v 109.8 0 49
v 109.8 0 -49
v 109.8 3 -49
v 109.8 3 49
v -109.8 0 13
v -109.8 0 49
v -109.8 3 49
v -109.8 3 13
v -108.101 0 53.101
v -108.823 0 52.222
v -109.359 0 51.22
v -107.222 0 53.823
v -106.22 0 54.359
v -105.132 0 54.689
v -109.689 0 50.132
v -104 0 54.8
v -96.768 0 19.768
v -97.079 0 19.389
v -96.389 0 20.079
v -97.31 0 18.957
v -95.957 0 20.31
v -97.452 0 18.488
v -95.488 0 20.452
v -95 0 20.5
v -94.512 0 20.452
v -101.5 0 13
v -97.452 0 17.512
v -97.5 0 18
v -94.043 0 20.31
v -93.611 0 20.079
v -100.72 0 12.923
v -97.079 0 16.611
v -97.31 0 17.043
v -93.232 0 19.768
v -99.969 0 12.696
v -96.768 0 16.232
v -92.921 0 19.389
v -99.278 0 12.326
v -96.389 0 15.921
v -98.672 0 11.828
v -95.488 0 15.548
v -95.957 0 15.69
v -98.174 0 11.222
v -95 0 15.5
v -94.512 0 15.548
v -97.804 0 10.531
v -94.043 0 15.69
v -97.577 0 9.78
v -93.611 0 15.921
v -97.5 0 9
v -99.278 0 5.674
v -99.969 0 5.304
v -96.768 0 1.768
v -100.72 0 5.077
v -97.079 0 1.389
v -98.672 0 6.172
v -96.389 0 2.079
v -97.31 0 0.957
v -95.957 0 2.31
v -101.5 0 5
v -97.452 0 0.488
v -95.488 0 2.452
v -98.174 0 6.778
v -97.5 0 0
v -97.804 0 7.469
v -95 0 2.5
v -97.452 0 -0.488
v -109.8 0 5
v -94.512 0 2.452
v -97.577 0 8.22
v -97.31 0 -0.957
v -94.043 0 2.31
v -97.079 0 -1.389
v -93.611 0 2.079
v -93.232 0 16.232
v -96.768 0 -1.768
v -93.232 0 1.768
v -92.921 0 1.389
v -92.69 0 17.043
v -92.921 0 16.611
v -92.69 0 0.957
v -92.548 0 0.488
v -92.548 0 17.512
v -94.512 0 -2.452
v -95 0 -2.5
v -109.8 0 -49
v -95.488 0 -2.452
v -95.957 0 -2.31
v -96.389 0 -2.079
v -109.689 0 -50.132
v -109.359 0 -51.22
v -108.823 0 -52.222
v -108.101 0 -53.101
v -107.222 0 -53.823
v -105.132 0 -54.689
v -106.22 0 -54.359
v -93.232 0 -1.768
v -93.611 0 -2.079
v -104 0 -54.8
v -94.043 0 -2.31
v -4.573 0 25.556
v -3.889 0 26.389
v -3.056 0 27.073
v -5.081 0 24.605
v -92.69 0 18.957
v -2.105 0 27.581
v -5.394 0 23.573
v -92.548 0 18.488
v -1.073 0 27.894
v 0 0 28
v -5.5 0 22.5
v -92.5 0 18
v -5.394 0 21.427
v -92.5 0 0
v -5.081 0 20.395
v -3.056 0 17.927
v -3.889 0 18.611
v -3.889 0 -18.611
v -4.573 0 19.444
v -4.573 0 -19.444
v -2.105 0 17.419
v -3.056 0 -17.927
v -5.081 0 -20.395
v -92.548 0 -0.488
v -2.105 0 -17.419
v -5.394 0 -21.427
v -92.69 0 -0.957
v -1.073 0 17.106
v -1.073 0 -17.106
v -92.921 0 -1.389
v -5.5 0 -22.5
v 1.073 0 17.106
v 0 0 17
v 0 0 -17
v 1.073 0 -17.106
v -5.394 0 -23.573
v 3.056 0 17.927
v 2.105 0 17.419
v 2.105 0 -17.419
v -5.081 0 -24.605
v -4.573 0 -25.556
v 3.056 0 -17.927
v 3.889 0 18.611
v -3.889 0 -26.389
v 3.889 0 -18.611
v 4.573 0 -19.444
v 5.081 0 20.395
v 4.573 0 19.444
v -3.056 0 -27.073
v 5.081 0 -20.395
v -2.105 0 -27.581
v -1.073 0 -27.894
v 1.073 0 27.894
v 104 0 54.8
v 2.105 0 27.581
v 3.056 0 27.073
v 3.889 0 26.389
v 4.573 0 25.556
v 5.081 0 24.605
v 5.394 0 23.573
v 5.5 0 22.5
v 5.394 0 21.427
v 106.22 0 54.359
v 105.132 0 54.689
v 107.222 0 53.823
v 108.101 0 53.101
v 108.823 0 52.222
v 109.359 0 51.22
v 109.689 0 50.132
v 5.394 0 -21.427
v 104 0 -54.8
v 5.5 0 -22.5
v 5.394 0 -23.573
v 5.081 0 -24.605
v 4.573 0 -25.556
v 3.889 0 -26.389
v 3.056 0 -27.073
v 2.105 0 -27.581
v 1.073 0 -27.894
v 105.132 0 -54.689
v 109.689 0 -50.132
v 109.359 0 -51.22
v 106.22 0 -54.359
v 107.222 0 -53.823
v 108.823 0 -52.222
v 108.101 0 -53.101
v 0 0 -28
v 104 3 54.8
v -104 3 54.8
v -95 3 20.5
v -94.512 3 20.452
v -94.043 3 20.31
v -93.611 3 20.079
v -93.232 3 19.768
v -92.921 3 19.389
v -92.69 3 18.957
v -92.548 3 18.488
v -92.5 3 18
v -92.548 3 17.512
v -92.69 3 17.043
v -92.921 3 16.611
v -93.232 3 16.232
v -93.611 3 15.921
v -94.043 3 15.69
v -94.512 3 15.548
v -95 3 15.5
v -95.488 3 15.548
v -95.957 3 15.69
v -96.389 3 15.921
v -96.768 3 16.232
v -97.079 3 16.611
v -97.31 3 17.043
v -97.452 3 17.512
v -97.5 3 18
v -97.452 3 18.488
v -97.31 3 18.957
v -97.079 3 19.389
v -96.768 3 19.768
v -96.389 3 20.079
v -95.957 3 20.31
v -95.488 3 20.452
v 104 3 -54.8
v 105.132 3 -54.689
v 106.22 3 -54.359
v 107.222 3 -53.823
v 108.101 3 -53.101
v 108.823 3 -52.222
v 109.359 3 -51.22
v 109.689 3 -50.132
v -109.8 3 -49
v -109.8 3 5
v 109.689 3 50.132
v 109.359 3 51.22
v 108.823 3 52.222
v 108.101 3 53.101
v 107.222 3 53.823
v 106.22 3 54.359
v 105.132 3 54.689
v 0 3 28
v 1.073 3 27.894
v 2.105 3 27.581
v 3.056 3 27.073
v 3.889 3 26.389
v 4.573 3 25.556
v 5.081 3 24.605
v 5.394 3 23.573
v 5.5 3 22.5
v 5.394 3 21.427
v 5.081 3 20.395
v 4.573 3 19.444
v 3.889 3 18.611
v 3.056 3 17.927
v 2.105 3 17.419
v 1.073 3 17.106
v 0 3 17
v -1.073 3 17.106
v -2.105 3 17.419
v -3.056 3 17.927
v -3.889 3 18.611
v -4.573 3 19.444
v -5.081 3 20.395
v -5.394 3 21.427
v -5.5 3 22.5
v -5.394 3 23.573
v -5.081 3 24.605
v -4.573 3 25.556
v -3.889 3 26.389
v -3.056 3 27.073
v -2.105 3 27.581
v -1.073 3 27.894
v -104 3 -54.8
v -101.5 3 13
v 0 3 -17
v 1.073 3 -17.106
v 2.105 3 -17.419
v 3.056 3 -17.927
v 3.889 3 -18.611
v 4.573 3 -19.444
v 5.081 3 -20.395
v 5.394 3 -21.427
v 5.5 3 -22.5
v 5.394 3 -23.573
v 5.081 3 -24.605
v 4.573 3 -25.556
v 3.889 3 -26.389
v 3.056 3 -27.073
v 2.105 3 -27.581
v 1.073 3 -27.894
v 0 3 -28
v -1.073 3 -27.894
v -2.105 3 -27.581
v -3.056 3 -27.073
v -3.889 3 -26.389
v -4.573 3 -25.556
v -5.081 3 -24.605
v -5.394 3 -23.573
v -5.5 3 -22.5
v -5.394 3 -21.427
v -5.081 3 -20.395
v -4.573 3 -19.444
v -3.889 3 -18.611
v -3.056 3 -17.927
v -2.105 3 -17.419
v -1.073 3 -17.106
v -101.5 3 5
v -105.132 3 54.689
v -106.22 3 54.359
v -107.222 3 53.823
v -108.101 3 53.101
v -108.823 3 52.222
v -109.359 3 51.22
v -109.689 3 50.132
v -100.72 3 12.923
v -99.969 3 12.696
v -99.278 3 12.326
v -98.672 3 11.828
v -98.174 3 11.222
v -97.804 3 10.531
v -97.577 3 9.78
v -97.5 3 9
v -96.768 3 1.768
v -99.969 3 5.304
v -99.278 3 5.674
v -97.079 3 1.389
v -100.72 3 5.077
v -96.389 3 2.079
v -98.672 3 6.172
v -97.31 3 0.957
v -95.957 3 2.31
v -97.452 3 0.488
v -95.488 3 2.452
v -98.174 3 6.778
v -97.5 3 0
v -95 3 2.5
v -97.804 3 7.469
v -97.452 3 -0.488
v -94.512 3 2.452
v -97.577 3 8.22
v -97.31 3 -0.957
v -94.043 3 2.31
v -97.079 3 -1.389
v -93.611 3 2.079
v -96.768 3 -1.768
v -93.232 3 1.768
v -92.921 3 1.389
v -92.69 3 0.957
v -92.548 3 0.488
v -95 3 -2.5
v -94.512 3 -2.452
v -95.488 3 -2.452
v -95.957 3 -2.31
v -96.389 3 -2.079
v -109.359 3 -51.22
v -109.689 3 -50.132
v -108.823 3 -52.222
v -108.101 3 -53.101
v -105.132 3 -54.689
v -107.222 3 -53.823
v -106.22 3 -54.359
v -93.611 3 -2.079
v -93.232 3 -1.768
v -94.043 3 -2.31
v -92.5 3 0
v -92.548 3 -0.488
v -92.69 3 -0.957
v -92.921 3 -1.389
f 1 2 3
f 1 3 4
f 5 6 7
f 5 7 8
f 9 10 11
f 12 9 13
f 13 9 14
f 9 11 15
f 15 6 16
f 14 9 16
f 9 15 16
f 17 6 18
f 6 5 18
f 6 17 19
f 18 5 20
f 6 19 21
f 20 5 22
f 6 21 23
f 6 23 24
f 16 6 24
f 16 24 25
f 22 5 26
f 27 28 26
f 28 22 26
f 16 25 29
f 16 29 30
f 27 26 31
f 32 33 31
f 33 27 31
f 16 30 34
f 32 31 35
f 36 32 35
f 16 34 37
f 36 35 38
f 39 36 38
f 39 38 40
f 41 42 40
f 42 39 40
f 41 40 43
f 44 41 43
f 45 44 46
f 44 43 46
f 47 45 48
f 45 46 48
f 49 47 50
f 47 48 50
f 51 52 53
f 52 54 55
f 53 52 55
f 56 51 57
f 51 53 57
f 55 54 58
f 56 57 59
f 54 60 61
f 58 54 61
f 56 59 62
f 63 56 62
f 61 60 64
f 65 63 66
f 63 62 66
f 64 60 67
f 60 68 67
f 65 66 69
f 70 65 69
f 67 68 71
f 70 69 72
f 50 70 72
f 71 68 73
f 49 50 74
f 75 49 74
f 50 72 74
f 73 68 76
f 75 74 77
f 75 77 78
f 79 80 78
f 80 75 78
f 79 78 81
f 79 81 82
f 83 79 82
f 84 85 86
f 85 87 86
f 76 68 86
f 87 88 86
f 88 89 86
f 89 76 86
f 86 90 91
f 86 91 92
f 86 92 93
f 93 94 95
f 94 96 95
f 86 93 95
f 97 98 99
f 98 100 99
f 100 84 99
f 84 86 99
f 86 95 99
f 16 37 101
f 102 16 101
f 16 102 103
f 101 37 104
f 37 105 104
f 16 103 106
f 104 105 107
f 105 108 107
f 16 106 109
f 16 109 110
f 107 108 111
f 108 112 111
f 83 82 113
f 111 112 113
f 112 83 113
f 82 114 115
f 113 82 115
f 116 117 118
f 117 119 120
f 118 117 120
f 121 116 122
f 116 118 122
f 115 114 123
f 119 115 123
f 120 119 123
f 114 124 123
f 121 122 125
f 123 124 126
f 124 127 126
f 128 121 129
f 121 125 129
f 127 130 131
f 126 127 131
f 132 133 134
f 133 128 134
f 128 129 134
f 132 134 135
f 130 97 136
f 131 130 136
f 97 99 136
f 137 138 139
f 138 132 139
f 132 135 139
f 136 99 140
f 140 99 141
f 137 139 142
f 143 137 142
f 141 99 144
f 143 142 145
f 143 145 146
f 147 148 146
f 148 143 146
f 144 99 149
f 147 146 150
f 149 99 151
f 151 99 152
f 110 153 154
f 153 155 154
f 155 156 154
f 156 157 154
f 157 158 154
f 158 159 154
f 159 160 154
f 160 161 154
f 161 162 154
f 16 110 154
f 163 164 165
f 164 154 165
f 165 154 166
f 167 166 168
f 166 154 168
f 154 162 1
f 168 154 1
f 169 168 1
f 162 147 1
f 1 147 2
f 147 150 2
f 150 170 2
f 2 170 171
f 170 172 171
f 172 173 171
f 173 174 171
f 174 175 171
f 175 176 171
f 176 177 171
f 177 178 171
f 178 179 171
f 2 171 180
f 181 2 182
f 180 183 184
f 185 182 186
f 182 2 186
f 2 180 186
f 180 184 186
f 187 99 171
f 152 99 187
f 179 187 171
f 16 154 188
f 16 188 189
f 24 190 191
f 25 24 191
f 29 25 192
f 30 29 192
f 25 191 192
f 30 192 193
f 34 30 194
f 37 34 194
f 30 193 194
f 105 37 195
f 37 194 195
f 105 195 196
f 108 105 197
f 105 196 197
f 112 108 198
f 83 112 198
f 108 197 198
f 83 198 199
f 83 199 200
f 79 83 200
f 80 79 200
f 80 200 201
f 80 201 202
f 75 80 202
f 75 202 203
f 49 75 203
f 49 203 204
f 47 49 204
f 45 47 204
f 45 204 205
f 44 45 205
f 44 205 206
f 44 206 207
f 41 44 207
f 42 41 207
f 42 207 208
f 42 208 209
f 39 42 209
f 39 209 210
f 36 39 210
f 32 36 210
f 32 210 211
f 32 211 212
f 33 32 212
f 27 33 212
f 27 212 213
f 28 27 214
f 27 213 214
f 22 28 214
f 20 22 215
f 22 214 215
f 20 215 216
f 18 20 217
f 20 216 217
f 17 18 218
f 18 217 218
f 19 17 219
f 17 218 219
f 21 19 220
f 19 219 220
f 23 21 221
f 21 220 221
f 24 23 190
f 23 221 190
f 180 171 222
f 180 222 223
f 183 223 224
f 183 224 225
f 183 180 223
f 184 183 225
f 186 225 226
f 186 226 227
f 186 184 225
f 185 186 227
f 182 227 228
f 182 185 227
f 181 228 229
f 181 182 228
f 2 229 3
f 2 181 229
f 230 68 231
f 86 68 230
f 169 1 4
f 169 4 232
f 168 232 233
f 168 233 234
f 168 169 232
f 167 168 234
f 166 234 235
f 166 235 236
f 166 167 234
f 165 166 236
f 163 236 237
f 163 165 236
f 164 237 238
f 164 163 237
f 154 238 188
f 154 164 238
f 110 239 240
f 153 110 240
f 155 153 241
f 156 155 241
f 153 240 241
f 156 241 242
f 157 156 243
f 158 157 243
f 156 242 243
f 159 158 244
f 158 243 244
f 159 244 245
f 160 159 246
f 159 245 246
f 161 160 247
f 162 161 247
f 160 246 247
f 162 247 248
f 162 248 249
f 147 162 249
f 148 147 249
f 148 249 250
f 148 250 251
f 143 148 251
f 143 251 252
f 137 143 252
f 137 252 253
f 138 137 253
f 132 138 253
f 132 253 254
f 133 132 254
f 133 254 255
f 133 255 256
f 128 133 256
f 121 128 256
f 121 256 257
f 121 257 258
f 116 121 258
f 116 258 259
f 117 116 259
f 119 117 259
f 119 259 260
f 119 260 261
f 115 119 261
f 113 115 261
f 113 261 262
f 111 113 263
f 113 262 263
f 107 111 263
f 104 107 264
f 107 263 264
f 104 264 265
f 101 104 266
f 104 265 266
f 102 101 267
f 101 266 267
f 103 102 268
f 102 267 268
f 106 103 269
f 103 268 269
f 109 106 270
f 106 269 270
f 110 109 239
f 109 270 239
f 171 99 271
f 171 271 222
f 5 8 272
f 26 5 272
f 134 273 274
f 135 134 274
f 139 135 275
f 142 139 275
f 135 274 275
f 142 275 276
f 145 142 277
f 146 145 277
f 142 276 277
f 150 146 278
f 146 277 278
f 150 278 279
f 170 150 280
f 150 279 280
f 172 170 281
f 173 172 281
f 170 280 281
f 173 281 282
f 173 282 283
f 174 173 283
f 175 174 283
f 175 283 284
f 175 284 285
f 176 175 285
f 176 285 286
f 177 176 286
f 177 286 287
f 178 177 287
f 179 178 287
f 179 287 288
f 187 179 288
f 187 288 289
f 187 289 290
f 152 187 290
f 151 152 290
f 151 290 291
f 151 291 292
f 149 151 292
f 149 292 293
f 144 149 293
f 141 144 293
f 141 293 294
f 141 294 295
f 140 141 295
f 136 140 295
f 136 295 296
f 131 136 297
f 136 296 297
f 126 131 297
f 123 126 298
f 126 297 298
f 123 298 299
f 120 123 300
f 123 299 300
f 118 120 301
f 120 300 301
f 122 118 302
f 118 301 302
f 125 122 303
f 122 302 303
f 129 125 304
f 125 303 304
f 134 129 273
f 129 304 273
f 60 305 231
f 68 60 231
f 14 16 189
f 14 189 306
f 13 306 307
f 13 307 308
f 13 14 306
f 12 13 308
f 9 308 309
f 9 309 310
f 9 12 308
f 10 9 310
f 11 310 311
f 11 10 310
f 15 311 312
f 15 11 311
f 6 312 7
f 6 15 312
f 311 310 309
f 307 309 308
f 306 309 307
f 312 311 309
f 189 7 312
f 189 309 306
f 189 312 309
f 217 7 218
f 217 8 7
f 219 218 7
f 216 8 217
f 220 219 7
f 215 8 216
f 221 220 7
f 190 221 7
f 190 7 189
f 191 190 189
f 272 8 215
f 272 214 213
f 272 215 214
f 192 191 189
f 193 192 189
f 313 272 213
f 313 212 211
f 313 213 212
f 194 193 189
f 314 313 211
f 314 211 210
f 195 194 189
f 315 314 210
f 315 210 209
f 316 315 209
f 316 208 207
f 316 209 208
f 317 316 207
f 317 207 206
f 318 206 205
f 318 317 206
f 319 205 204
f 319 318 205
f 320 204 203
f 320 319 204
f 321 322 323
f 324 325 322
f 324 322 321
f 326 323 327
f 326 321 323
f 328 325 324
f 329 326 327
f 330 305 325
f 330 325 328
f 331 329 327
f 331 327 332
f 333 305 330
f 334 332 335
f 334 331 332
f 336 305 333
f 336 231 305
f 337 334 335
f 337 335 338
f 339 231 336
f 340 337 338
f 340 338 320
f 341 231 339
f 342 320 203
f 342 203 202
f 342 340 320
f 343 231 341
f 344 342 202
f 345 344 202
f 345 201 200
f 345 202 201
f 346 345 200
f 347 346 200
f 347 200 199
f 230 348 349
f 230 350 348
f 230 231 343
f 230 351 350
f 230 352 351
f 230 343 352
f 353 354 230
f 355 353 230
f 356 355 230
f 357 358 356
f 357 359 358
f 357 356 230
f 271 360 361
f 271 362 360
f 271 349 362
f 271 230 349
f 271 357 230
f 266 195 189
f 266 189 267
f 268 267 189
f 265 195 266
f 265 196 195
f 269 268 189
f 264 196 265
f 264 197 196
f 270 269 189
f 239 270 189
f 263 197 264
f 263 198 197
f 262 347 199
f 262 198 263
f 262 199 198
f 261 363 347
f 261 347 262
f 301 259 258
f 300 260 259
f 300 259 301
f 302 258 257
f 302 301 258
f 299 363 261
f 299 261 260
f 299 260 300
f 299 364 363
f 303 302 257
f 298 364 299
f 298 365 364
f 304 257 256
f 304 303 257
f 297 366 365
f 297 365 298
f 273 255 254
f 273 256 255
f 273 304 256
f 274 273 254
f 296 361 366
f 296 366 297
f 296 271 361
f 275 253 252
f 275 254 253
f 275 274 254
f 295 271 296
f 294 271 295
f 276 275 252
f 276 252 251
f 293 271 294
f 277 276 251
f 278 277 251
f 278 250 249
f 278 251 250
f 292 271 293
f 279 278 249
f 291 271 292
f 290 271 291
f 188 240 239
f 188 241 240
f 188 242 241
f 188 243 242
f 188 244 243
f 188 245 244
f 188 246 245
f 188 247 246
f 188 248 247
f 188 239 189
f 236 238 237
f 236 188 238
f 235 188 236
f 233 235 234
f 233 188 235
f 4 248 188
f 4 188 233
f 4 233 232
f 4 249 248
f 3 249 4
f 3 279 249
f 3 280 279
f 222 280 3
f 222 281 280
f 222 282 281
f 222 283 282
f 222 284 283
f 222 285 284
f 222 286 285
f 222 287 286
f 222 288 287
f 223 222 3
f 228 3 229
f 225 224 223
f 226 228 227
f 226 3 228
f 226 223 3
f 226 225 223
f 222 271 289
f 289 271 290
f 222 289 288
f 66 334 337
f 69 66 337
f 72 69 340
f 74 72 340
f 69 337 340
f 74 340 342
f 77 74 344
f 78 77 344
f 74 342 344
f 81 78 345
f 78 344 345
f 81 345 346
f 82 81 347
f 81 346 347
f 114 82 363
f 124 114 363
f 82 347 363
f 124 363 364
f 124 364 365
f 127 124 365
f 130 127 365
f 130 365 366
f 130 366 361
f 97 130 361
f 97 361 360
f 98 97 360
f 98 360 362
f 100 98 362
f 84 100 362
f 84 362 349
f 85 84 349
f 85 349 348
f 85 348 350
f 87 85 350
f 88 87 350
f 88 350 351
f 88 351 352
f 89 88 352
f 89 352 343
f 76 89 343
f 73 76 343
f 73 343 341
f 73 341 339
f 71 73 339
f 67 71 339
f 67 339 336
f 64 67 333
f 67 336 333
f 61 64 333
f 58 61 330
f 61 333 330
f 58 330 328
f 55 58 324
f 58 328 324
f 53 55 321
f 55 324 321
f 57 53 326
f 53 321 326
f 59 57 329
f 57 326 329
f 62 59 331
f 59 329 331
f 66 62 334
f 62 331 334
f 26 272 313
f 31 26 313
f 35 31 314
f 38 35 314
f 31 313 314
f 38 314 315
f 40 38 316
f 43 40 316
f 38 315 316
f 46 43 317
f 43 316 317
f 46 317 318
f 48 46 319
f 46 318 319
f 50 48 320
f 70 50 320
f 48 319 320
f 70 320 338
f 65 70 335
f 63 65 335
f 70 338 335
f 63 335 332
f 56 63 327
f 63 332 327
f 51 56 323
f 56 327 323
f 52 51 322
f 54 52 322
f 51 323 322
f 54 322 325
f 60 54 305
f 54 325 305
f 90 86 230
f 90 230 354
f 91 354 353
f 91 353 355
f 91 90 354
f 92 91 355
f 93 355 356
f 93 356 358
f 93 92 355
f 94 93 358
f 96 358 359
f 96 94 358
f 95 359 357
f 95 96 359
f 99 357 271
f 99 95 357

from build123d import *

# Parameters (mm, degrees)
SKETCH_1_W          = 220
SKETCH_1_H          = 110
EXTRUDE_1_DEPTH     = 3
SKETCH_2_W          = 220
SKETCH_2_H          = 110
CUT_EXTRUDE_1_DEPTH = 10
SKETCH_3_R          = 2.5
SKETCH_3_R_2        = 1.5875
CUT_EXTRUDE_2_DEPTH = 123.752107925
SKETCH_4_R          = 5.5
CUT_EXTRUDE_3_DEPTH = 123.752107925


with BuildPart() as part:
    # Эскиз1 → Бобышка-Вытянуть1 (new body)
    with BuildSketch(Plane(origin=(0, 0, 0), x_dir=(1, 0, 0), z_dir=(0, 1, 0))):
        Rectangle(SKETCH_1_W, SKETCH_1_H)
    extrude(amount=EXTRUDE_1_DEPTH)

    # Эскиз2 → Вырез-Вытянуть1 (cut)
    with BuildSketch(Plane.XZ):
        Rectangle(SKETCH_2_W, SKETCH_2_H)
        with BuildLine():
            ThreePointArc((104, -54.8), (108.101219331, -53.101219331), (109.8, -49))
            Line((109.8, -49), (109.8, 49))
            ThreePointArc((109.8, 49), (108.101219331, 53.101219331), (104, 54.8))
            Line((104, 54.8), (-104, 54.8))
            ThreePointArc((-104, 54.8), (-108.101219331, 53.101219331), (-109.8, 49))
            Line((-109.8, 49), (-109.8, -49))
            ThreePointArc((-109.8, -49), (-108.101219331, -53.101219331), (-104, -54.8))
            Line((-104, -54.8), (104, -54.8))
        make_face(mode=Mode.SUBTRACT)
    extrude(amount=-CUT_EXTRUDE_1_DEPTH, mode=Mode.SUBTRACT)

    # Эскиз3 → Вырез-Вытянуть2 (cut, through all)
    # profile 1 of 5: a face of its own
    with BuildSketch(Plane(origin=(0, 3, 0), x_dir=(1, 0, 0), z_dir=(0, 1, 0))):
        with Locations(Location((-95, 0, 0), (0, 0, 270))):
            Circle(SKETCH_3_R)
        with Locations((-95, 0)):
            Circle(SKETCH_3_R_2, mode=Mode.SUBTRACT)
    # profile 2 of 5: a face of its own
    with BuildSketch(Plane(origin=(0, 3, 0), x_dir=(1, 0, 0), z_dir=(0, 1, 0))):
        with Locations((-95, 0)):
            Circle(SKETCH_3_R_2)
    # profile 3 of 5: a face of its own
    with BuildSketch(Plane(origin=(0, 3, 0), x_dir=(1, 0, 0), z_dir=(0, 1, 0))):
        with Locations(Location((-95, -18, 0), (0, 0, 270))):
            Circle(SKETCH_3_R)
        with Locations((-95, -18)):
            Circle(SKETCH_3_R_2, mode=Mode.SUBTRACT)
    # profile 4 of 5: a face of its own
    with BuildSketch(Plane(origin=(0, 3, 0), x_dir=(1, 0, 0), z_dir=(0, 1, 0))):
        with Locations((-95, -18)):
            Circle(SKETCH_3_R_2)
    # profile 5 of 5: a face of its own
    with BuildSketch(Plane(origin=(0, 3, 0), x_dir=(1, 0, 0), z_dir=(0, 1, 0))):
        with BuildLine():
            ThreePointArc((-101.5, -13), (-97.5, -9), (-101.5, -5))
            Line((-101.5, -5), (-109.8, -5))
            Line((-109.8, -5), (-109.8, -13))
            Line((-109.8, -13), (-101.5, -13))
        make_face()
    extrude(amount=-CUT_EXTRUDE_2_DEPTH, mode=Mode.SUBTRACT)

    # Эскиз4 → Вырез-Вытянуть3 (cut, through all)
    with BuildSketch(Plane(origin=(0, 3, 0), x_dir=(1, 0, 0), z_dir=(0, 1, 0))):
        with Locations(Location((0, 22.5, 0), (0, 0, 270))):
            Circle(SKETCH_4_R)
        with Locations(Location((0, -22.5, 0), (0, 0, 270))):
            Circle(SKETCH_4_R)
    extrude(amount=-CUT_EXTRUDE_3_DEPTH, mode=Mode.SUBTRACT)


solid = part.part
